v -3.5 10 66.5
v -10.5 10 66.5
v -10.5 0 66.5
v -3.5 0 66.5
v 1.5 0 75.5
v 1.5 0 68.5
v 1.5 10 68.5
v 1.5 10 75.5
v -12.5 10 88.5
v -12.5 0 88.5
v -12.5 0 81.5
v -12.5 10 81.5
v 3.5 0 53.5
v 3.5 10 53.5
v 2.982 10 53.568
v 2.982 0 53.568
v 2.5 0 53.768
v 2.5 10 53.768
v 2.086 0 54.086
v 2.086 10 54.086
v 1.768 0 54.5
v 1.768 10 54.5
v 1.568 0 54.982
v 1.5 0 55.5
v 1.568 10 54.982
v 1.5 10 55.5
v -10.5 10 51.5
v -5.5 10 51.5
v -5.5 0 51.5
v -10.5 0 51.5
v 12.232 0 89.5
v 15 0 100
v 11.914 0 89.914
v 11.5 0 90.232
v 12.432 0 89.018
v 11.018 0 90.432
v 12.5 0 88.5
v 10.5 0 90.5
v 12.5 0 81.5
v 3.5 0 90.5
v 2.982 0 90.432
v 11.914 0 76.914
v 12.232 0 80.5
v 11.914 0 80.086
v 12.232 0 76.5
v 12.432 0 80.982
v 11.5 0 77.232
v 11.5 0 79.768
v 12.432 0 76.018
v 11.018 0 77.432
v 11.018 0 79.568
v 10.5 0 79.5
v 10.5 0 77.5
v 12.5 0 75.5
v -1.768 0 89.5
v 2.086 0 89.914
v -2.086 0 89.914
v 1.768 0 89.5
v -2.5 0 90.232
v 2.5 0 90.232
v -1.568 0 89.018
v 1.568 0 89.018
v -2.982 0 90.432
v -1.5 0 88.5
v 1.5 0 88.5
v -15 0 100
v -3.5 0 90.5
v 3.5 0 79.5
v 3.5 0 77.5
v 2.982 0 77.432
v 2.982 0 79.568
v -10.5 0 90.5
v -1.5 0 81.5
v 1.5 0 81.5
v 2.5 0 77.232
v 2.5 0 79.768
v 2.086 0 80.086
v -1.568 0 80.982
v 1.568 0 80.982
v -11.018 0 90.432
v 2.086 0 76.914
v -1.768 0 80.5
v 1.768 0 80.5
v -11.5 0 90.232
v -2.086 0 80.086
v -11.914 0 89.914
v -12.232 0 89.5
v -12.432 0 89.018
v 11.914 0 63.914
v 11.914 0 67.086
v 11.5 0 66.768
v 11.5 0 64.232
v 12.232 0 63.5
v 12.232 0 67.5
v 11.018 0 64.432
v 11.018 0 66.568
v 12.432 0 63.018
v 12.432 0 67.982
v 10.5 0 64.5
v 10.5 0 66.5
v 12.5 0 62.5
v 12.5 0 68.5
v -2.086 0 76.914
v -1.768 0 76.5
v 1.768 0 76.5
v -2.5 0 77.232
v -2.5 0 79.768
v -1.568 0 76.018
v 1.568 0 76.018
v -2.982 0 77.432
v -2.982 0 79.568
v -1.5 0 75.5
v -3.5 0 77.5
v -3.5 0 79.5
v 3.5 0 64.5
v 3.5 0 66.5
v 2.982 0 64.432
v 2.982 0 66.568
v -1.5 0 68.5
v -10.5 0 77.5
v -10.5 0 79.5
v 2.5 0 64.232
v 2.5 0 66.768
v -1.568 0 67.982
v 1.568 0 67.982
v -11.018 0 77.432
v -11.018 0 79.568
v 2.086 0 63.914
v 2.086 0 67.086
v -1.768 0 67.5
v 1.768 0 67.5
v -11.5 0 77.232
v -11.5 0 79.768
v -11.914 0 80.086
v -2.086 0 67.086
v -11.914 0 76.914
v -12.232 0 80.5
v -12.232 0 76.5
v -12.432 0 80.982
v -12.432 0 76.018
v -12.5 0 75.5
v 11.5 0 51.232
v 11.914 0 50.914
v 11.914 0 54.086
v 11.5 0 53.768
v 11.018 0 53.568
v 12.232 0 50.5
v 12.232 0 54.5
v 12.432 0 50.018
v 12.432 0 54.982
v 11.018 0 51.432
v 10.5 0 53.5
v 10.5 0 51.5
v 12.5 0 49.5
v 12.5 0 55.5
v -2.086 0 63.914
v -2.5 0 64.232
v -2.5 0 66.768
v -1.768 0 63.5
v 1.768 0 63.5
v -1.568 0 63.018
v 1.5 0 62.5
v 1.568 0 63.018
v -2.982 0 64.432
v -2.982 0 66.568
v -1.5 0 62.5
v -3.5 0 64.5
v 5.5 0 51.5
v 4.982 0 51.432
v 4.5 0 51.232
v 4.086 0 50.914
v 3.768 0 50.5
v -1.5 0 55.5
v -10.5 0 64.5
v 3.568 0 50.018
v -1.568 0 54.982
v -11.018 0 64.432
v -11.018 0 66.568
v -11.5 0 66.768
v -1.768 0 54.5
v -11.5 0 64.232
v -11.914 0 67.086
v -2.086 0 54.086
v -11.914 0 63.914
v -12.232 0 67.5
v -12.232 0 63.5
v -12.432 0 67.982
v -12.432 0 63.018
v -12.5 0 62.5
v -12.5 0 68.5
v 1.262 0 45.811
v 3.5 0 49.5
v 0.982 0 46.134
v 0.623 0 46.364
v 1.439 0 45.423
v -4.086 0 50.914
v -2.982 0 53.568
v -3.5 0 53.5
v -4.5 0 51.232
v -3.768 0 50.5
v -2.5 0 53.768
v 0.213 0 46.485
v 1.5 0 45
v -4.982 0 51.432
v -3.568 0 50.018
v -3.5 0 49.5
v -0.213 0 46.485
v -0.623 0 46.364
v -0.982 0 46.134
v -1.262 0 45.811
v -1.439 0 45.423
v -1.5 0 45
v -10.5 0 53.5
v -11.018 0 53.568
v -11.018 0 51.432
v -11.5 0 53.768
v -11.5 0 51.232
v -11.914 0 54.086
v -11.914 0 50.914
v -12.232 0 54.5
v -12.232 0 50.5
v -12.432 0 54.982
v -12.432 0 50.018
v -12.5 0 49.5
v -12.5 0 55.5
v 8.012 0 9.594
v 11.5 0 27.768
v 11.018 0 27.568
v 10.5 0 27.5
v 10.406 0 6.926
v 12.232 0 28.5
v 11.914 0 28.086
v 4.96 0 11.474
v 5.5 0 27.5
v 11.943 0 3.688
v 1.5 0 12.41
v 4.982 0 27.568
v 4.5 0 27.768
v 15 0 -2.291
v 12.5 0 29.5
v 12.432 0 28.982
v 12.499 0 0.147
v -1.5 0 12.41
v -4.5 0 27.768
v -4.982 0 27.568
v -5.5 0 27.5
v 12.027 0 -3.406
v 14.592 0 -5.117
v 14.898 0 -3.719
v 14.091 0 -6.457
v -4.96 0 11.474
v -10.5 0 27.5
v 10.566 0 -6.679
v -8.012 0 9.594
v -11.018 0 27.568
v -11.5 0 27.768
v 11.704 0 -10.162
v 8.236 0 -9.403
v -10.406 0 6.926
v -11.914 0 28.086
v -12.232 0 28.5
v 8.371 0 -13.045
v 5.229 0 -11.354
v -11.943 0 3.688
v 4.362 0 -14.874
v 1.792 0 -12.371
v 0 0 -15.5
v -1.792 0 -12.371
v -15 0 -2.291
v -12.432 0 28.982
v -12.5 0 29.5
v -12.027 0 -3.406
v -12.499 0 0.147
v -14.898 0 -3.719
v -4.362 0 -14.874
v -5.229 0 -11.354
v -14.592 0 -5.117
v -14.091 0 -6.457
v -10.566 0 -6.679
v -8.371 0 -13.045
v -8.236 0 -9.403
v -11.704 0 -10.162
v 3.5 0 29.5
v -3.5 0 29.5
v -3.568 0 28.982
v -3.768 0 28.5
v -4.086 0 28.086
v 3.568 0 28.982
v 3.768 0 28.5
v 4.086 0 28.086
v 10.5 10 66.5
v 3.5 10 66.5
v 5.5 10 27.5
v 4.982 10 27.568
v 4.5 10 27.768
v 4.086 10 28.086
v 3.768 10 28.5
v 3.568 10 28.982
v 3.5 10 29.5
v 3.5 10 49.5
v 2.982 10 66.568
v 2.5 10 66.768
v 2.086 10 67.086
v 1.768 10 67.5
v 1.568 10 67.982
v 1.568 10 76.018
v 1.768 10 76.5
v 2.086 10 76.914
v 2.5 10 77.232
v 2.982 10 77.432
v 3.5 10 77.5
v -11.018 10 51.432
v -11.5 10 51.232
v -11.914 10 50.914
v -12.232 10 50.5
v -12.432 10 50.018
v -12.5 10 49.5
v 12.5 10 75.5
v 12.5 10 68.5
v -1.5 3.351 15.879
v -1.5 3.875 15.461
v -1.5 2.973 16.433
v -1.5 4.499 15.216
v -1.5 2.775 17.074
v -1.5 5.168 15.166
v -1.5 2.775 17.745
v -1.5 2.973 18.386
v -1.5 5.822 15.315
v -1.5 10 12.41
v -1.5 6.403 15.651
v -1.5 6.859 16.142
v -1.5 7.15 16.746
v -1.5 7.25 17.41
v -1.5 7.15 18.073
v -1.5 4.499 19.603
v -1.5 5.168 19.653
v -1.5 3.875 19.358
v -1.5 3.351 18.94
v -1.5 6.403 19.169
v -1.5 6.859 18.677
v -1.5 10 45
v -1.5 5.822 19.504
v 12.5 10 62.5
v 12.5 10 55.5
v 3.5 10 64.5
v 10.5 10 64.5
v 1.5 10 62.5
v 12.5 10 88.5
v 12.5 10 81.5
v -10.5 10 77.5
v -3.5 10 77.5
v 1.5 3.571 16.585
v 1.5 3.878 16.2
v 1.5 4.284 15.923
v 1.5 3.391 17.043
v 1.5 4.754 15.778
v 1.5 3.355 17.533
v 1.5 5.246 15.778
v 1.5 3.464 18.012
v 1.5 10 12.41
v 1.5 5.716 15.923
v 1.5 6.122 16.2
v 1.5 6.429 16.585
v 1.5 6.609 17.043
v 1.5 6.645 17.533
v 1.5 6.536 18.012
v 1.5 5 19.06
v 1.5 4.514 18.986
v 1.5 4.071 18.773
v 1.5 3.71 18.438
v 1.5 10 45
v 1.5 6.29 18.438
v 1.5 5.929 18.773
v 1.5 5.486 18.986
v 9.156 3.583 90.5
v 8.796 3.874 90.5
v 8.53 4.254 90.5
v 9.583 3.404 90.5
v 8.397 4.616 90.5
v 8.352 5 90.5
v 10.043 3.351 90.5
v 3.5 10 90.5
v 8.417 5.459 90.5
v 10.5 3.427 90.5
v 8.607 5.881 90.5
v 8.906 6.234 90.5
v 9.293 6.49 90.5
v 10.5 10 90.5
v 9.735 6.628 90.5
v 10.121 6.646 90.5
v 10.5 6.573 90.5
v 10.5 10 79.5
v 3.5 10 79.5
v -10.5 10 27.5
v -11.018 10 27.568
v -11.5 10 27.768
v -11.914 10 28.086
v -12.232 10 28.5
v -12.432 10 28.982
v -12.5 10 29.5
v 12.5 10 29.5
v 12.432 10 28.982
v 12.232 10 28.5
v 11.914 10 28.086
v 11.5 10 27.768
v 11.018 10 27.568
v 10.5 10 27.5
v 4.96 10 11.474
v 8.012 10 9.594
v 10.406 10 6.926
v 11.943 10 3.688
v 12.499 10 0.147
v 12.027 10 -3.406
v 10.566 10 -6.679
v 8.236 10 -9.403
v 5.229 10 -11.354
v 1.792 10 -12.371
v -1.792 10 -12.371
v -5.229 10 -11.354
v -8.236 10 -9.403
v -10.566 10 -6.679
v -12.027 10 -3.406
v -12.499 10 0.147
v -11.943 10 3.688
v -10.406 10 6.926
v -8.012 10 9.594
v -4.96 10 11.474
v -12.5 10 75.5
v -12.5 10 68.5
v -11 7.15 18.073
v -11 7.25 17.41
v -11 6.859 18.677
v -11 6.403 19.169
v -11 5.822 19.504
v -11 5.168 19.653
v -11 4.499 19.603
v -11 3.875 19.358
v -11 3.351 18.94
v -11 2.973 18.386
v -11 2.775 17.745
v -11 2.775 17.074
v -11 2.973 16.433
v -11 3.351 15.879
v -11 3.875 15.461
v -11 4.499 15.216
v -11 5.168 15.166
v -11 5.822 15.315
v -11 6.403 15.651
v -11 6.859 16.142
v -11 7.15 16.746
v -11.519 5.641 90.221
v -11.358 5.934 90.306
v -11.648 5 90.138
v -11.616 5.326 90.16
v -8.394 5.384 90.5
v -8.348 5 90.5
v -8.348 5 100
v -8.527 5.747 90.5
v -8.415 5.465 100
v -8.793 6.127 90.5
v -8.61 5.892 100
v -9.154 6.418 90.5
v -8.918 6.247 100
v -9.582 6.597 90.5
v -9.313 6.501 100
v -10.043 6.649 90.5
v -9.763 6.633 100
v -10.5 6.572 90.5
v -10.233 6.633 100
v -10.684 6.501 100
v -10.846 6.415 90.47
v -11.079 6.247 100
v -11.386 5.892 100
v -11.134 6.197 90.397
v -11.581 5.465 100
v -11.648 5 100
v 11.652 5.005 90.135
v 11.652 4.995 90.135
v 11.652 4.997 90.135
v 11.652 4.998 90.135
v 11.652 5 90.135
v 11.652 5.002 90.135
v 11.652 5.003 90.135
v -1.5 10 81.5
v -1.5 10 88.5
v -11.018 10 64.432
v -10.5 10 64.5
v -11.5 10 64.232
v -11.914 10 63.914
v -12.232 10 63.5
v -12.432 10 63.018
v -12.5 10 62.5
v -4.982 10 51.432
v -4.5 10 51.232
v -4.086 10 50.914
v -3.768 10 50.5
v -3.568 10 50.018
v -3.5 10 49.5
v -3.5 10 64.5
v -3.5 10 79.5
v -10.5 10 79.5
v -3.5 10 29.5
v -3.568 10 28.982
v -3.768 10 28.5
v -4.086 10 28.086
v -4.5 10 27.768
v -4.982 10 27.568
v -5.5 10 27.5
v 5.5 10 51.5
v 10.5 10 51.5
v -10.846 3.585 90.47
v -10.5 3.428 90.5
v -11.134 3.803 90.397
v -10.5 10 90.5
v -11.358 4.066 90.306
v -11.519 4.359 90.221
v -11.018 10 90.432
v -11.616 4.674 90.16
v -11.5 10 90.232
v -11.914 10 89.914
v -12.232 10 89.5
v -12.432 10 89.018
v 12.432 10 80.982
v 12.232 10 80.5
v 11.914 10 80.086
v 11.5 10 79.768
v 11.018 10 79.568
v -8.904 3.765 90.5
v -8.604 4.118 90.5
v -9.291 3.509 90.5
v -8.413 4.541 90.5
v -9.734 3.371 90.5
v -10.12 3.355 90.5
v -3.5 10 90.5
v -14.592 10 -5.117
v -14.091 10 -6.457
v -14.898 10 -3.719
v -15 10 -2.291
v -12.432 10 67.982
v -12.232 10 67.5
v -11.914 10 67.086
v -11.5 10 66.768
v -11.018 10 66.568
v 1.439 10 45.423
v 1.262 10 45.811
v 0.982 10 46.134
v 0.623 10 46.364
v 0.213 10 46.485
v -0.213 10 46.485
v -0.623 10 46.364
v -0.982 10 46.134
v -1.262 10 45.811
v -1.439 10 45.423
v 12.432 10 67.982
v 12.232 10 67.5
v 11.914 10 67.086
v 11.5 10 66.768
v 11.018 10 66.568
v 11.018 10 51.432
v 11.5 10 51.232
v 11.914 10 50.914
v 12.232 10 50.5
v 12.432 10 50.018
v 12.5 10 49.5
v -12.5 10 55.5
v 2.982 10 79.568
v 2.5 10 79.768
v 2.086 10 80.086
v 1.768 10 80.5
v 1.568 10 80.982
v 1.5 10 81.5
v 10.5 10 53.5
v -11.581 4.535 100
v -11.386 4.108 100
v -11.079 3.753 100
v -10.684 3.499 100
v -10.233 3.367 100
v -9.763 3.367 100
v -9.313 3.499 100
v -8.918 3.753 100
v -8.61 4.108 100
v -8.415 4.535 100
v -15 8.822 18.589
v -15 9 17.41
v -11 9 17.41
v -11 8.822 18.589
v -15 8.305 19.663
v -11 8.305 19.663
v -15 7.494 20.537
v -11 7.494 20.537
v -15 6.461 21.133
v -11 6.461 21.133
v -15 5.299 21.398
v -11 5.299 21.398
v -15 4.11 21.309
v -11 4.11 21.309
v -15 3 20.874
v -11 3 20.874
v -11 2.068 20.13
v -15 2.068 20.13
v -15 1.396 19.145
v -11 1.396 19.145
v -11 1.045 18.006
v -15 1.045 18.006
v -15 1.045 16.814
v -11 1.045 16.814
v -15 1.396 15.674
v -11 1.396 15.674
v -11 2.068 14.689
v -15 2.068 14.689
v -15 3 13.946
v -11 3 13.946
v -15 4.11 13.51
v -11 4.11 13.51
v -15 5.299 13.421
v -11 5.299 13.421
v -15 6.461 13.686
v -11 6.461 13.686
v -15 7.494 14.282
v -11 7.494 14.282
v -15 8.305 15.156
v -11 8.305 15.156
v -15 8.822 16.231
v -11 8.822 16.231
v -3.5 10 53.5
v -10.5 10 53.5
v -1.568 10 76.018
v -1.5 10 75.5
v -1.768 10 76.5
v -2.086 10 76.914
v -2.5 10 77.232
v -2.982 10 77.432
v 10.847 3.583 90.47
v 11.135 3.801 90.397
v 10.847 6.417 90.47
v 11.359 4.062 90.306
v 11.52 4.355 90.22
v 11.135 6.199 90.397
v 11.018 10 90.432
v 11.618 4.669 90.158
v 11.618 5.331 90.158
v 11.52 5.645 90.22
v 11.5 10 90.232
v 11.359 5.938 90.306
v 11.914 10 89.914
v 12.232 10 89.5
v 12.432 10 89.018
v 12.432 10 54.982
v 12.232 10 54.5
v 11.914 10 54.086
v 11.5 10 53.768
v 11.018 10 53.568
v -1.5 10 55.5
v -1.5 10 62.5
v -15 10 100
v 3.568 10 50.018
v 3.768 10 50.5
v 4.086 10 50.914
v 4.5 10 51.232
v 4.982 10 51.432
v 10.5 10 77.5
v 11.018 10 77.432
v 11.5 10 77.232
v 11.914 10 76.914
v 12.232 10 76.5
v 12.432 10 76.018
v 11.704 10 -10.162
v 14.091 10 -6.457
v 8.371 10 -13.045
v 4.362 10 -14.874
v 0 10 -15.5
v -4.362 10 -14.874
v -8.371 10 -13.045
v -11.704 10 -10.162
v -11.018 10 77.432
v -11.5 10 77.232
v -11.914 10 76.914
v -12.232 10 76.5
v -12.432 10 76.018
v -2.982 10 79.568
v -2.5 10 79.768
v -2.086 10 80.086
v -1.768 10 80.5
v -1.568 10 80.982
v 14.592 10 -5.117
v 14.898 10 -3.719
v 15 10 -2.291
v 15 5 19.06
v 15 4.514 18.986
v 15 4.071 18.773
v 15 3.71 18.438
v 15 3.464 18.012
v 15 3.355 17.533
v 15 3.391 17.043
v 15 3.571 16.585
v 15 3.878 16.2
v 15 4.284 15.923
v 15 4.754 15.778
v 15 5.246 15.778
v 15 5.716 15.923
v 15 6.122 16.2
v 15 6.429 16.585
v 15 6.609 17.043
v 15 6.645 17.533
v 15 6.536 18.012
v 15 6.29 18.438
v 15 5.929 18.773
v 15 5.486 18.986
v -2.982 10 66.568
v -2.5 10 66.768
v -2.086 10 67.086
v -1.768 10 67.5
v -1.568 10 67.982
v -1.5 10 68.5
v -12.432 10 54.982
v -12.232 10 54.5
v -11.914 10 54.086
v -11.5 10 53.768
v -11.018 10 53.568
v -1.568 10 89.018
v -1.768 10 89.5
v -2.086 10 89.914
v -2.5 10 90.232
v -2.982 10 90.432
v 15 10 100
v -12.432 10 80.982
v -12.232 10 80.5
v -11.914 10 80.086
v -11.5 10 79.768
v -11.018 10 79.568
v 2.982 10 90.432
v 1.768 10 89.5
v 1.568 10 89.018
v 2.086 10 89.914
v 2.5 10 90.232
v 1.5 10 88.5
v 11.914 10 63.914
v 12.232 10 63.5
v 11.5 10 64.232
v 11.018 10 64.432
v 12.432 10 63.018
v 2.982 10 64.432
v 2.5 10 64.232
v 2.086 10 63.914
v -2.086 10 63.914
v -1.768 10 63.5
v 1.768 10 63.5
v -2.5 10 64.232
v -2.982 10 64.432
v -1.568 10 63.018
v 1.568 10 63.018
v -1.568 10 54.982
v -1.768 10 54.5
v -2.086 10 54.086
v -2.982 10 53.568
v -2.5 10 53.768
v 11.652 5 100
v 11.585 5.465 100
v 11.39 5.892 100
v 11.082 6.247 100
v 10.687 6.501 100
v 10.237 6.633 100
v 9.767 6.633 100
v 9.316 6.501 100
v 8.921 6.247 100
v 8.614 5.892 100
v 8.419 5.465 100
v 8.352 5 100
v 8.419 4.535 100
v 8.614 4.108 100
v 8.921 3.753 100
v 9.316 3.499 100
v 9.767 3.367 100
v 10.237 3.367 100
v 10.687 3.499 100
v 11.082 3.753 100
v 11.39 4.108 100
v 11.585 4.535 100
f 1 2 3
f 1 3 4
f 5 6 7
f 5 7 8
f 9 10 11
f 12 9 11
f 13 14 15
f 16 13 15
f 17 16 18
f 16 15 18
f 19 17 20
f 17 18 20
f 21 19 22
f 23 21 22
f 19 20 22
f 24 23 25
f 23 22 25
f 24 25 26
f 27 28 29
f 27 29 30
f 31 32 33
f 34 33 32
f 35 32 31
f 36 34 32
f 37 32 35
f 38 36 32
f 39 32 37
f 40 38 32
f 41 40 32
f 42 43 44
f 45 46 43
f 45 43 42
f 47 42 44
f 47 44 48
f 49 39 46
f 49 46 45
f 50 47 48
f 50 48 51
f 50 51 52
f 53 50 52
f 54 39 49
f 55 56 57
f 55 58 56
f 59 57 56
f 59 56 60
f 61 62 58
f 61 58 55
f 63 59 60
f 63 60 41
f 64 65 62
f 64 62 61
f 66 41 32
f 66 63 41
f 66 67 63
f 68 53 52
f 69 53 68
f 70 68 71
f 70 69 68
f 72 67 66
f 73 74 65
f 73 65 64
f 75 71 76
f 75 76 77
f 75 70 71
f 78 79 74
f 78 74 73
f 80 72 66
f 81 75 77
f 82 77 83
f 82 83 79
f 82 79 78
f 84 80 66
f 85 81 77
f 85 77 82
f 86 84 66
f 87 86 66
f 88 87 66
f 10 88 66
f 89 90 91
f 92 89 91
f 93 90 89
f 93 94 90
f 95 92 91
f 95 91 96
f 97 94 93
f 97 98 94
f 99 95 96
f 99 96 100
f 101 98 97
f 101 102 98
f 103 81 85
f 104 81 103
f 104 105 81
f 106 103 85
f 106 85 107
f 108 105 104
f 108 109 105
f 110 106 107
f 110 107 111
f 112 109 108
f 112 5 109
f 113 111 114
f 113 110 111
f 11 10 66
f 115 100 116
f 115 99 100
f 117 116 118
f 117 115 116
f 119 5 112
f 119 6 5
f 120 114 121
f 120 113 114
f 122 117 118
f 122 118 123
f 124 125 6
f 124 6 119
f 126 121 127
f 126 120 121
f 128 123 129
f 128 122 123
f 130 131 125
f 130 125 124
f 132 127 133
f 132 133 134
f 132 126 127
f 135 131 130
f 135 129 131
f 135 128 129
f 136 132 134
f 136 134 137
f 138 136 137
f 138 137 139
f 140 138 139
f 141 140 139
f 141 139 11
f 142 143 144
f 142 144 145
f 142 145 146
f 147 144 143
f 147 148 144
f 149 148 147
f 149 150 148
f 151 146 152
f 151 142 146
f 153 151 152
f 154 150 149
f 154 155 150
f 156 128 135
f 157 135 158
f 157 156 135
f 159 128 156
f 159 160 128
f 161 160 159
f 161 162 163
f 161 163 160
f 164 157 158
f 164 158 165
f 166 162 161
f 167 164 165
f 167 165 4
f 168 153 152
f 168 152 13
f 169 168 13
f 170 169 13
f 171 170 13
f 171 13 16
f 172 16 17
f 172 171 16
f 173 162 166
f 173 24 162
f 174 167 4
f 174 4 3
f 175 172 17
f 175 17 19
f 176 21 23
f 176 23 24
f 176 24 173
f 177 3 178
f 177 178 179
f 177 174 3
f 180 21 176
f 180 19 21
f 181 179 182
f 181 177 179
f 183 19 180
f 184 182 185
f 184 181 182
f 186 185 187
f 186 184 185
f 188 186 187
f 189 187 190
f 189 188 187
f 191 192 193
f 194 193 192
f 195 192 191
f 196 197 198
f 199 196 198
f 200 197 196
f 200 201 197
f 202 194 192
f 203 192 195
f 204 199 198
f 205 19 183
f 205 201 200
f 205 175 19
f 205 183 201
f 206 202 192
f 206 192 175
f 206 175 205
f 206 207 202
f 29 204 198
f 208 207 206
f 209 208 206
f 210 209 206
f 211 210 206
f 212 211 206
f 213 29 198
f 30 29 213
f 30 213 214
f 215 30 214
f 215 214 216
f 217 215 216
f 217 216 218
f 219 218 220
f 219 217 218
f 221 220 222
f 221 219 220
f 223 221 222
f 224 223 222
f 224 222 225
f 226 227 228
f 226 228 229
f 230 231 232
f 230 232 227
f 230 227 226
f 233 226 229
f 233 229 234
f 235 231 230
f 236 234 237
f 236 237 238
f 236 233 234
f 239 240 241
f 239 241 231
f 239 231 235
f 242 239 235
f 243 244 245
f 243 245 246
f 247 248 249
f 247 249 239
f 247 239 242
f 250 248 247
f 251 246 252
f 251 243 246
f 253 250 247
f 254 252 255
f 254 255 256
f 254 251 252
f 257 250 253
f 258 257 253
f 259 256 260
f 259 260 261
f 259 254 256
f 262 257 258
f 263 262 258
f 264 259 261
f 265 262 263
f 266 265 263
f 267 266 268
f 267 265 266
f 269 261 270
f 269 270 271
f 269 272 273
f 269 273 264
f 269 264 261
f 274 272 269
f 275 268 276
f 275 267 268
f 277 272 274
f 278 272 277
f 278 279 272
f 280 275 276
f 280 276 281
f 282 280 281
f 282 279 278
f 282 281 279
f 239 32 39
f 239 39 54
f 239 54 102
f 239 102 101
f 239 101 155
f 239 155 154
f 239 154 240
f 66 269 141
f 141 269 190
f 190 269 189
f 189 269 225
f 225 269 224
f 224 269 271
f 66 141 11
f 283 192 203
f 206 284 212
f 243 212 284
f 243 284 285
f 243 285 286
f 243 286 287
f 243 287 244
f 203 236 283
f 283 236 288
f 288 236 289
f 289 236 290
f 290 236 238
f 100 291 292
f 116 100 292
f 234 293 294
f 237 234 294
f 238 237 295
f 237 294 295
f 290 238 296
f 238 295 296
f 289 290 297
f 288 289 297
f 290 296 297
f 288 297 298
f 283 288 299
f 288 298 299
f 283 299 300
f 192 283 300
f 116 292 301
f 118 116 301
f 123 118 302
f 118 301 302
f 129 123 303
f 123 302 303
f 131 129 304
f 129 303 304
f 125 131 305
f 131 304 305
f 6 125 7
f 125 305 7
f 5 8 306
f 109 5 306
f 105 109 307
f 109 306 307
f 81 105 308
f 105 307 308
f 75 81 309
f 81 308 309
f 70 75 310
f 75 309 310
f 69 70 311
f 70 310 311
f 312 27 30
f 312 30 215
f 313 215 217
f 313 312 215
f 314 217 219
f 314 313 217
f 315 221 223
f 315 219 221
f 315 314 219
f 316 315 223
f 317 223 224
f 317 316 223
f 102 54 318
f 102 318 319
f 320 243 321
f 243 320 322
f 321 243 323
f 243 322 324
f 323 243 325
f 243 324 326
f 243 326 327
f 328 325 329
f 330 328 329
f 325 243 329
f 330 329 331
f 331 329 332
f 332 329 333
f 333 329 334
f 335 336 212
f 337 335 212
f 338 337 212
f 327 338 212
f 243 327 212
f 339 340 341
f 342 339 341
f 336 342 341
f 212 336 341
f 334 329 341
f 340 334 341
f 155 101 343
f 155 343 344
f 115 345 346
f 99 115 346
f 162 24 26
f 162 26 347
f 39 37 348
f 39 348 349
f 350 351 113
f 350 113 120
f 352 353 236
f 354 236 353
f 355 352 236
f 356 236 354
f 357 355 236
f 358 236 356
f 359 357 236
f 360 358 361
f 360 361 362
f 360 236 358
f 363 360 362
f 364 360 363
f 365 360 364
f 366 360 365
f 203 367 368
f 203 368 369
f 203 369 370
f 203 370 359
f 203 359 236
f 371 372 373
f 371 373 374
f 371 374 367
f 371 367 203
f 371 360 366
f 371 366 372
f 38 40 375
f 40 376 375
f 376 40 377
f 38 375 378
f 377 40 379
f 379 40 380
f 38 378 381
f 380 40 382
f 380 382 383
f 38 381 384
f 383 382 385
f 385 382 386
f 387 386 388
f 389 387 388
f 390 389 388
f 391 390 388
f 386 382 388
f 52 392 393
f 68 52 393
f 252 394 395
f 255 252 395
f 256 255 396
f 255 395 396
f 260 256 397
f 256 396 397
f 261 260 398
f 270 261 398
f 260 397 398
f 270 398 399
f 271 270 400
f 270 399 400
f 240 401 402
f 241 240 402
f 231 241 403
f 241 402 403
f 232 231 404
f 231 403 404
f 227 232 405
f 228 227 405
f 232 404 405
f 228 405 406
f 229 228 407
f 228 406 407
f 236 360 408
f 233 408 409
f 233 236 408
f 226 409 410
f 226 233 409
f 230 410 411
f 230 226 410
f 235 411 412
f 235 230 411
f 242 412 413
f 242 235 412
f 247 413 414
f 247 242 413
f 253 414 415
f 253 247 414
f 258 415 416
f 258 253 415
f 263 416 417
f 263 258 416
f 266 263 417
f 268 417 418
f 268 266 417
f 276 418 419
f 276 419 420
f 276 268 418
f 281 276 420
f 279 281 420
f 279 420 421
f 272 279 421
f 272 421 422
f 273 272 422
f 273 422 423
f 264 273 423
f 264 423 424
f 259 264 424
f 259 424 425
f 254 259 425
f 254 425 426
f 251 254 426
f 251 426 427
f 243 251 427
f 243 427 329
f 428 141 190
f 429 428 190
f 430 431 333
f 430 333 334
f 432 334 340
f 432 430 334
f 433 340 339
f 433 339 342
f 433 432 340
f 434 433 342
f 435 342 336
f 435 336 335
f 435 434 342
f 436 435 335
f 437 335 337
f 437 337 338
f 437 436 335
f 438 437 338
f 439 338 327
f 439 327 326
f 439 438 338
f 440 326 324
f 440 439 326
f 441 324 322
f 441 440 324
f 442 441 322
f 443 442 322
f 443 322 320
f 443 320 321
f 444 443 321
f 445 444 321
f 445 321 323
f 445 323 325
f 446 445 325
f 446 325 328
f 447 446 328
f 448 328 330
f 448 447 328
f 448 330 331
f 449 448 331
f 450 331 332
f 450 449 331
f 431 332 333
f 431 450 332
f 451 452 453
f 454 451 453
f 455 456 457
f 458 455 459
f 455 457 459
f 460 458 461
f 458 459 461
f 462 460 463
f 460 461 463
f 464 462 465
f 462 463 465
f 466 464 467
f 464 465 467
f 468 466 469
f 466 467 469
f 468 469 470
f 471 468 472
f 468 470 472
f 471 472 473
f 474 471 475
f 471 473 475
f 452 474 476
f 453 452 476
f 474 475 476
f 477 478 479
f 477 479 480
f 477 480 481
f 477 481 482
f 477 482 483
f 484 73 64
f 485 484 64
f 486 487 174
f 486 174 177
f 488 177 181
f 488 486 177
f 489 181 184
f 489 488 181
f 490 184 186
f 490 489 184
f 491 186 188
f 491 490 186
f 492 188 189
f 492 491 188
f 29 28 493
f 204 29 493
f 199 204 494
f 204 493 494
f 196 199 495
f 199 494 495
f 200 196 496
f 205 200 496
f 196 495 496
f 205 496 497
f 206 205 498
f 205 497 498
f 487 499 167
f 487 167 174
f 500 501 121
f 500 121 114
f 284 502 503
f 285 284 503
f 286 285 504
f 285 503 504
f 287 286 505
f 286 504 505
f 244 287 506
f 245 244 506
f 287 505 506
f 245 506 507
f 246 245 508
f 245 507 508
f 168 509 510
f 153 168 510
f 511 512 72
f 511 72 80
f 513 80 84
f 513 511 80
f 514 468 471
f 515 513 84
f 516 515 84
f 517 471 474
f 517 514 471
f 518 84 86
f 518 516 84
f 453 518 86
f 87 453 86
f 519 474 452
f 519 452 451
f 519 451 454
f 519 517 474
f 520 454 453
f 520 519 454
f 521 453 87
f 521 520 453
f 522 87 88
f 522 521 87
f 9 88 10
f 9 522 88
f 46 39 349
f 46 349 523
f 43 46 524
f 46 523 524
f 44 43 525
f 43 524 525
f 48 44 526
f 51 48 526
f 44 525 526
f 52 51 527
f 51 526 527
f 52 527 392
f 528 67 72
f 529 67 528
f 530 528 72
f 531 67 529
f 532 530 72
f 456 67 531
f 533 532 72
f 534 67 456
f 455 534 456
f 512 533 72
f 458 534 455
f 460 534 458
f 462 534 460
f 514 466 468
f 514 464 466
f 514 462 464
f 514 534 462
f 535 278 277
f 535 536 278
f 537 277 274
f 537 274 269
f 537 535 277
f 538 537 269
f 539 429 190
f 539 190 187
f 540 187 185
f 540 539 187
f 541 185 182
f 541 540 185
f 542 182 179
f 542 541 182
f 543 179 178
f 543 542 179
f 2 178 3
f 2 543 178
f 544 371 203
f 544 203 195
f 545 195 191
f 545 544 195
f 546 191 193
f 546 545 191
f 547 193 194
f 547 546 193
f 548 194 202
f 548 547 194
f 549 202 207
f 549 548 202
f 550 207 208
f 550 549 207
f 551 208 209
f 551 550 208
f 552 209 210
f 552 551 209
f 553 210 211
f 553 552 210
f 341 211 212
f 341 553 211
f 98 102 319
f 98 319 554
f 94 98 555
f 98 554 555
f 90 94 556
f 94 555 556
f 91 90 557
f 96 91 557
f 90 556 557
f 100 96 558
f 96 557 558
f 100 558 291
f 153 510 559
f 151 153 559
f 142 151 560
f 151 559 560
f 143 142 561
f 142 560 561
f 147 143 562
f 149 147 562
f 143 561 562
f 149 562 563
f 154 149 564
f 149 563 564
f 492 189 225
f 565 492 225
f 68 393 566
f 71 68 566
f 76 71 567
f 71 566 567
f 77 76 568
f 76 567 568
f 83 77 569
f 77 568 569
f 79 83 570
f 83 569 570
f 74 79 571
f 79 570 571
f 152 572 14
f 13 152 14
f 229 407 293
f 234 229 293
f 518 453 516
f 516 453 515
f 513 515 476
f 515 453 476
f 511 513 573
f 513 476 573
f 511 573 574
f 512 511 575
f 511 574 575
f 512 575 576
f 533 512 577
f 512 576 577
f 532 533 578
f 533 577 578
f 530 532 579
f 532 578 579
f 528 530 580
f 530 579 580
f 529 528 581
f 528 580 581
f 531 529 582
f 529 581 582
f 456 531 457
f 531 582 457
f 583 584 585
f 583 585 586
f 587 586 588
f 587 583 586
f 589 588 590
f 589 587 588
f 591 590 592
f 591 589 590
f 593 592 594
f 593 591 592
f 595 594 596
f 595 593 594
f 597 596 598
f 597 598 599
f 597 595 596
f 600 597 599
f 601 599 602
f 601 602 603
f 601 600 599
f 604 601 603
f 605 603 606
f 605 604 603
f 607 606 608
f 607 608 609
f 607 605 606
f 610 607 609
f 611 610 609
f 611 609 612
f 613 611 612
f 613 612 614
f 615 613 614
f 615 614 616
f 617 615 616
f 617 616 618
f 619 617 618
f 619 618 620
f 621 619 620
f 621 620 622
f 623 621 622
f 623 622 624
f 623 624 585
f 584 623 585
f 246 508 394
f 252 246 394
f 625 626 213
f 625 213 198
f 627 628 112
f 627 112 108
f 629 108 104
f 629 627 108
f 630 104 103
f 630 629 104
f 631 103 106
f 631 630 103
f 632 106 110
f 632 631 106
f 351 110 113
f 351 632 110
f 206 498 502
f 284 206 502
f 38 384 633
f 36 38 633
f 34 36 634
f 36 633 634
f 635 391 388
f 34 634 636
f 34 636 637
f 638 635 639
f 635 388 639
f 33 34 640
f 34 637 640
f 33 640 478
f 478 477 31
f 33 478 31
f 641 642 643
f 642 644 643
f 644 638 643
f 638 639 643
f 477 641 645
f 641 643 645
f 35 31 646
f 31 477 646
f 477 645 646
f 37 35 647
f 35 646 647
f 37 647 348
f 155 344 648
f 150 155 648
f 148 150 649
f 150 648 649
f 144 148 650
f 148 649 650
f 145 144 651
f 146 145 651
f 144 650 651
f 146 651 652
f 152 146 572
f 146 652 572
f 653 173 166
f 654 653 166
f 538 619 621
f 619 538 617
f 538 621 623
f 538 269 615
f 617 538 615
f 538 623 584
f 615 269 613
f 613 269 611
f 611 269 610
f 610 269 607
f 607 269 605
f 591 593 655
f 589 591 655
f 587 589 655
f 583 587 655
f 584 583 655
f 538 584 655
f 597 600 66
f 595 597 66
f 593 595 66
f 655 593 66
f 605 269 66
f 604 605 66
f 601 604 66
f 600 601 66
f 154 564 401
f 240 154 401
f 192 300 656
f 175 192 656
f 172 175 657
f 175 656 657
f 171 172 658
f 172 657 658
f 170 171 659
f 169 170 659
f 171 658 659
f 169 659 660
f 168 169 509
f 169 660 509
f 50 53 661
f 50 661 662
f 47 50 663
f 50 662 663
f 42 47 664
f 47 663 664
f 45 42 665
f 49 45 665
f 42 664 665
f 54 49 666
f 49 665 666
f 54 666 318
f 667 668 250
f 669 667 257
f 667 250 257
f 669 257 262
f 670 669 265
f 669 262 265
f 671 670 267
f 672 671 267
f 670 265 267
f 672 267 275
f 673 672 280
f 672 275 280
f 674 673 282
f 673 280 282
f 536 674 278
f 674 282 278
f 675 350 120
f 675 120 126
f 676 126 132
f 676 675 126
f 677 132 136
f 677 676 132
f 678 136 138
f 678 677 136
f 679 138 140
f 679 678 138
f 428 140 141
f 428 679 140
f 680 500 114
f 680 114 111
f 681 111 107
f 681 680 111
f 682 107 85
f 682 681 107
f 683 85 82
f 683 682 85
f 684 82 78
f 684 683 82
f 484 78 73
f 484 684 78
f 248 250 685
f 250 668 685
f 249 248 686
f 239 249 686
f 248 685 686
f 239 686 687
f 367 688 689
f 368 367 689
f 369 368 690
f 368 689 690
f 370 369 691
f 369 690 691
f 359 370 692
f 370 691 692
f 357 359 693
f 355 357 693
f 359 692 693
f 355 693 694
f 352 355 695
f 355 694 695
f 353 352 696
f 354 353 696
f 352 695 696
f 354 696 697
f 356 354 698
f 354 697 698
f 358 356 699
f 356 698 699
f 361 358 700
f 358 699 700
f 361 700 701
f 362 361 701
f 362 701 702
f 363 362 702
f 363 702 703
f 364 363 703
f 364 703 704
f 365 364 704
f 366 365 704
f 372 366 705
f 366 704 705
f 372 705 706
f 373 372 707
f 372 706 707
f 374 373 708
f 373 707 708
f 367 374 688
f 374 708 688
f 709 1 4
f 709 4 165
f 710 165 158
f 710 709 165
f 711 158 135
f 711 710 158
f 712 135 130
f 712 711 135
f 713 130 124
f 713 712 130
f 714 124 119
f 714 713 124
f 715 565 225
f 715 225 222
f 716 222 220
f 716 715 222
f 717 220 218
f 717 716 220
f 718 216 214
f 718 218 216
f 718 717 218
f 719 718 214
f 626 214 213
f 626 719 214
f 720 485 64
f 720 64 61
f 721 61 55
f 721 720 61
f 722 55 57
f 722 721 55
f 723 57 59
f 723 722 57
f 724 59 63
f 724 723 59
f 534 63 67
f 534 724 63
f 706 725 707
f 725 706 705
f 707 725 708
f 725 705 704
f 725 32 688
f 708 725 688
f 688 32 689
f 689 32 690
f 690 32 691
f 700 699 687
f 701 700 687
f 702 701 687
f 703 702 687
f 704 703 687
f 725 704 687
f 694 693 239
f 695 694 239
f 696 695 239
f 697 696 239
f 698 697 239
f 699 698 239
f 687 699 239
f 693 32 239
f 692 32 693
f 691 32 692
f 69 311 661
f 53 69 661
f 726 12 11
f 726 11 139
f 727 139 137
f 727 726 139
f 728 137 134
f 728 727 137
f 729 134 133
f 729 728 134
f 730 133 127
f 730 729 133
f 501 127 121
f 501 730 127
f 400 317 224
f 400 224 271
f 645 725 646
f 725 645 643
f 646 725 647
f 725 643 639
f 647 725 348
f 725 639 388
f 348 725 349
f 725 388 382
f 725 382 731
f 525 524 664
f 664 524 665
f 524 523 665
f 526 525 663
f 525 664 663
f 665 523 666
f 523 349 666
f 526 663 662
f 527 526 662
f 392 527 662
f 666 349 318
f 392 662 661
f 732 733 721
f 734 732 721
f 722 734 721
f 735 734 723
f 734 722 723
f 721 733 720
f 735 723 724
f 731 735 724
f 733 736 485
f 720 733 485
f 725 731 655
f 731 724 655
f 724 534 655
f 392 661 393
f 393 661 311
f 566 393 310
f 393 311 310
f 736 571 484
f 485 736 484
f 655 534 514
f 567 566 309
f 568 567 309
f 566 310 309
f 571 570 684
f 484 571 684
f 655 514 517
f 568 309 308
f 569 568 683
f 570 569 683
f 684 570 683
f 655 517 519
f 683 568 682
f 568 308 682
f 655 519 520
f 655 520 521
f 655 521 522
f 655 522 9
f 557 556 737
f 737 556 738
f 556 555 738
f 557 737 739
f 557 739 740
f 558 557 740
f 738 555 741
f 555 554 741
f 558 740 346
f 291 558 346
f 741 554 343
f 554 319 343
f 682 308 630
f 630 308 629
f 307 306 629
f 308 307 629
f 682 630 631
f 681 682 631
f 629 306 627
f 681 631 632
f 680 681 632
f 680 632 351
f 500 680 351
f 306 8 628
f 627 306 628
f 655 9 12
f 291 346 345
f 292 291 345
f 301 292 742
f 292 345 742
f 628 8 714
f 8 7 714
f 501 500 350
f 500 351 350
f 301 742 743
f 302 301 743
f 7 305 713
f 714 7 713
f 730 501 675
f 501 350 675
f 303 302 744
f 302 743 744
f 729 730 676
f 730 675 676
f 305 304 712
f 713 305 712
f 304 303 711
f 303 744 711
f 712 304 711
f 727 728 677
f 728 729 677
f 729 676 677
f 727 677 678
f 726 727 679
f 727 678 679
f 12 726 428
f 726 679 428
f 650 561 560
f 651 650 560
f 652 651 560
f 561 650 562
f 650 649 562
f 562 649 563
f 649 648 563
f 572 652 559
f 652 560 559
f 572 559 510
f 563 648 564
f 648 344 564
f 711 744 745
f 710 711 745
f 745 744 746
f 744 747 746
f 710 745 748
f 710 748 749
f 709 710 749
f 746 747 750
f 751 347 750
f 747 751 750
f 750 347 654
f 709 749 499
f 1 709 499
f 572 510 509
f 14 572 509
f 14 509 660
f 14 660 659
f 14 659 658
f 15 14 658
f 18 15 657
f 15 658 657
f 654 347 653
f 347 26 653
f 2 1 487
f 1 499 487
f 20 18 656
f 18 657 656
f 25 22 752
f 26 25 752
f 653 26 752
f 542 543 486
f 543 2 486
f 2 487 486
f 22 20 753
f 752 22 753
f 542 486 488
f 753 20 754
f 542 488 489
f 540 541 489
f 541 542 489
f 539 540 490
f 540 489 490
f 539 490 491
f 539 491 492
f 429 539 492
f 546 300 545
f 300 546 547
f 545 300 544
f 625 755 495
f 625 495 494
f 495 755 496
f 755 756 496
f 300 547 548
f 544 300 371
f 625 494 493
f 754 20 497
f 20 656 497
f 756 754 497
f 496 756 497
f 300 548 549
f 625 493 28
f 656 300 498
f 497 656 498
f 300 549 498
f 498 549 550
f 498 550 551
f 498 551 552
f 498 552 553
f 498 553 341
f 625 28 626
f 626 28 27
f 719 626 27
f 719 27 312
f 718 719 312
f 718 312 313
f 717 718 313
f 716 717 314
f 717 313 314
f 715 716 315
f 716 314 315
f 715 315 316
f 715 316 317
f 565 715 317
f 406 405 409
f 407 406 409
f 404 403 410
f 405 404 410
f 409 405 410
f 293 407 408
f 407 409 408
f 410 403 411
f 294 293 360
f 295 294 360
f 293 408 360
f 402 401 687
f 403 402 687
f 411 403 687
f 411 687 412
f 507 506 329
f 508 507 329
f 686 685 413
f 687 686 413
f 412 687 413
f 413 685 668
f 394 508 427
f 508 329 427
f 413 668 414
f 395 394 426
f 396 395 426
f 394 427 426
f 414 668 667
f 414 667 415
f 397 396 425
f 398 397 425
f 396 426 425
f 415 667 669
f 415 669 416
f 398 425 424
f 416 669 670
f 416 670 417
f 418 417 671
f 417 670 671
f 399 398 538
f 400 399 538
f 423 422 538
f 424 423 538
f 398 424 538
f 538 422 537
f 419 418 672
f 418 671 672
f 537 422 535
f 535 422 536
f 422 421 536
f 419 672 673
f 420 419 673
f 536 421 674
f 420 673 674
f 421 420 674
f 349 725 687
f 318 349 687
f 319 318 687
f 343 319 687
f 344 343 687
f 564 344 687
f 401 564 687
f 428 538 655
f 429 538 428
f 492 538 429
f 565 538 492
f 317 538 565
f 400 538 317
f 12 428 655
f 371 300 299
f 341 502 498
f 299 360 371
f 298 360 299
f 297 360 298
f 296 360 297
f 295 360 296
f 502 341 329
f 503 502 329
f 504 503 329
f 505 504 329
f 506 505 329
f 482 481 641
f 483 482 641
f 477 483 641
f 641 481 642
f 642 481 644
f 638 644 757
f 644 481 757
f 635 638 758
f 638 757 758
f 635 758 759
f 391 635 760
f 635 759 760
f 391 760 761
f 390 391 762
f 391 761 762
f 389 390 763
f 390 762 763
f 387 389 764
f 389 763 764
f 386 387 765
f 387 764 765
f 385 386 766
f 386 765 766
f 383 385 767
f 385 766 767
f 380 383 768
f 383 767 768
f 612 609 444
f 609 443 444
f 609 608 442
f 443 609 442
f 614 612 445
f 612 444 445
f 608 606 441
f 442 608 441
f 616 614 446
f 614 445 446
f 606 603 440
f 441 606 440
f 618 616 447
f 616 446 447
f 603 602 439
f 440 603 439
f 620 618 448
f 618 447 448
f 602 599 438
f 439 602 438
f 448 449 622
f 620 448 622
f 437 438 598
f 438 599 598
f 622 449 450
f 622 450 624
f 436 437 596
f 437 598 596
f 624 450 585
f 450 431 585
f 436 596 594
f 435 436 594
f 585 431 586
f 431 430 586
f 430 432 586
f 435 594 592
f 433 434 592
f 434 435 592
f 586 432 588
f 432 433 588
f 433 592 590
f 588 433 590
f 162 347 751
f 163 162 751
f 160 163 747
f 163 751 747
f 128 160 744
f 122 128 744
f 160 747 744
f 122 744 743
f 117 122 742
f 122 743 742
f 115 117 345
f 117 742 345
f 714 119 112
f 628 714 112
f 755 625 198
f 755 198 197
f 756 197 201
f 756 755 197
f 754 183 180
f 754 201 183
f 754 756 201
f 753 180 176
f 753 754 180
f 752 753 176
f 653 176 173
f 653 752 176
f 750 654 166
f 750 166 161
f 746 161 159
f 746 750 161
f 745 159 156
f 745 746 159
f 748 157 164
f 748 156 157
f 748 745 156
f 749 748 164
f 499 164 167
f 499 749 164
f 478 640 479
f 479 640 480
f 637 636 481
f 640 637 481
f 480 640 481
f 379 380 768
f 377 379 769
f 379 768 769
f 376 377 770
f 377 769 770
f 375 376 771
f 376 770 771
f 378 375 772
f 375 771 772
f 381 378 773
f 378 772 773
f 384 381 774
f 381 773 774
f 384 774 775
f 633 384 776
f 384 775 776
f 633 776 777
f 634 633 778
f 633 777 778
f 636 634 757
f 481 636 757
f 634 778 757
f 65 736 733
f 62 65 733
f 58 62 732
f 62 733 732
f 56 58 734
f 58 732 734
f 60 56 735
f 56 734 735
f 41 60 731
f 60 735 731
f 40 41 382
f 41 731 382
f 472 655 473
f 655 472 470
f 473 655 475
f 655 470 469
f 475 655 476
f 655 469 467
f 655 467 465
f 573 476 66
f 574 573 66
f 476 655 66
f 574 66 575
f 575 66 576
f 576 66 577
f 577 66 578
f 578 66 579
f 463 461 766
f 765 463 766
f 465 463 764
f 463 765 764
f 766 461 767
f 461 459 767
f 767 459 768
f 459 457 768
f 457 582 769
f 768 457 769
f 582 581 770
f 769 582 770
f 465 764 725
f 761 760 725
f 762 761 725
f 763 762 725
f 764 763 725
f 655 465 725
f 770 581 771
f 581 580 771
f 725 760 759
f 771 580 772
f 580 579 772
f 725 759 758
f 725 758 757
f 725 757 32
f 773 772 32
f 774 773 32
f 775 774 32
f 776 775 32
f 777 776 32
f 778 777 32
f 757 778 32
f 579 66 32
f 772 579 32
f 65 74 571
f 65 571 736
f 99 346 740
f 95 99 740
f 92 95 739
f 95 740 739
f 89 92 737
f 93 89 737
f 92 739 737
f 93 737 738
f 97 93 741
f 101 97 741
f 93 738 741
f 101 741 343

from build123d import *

# Parameters (mm, degrees)
SKETCH_1_R                  = 12.5
EXTRUDE_1_DEPTH             = 10
CUT_EXTRUDE_5_DEPTH         = 102.687019821
SKETCH_8_W                  = 1.65
SKETCH_8_H                  = 14
HOLE_START                  = -16
HOLE_WIZARD_M41_OUTLINE_R   = 4
HOLE_WIZARD_M41_DEPTH       = 5
HOLE_START_2                = -11
HOLE_WIZARD_M41_2_OUTLINE_R = 2.25
HOLE_WIZARD_M41_2_DEPTH     = 9.5
CUT_EXTRUDE_START           = -10
CUT_EXTRUDE_6_DEPTH         = 10
FILLET_1_R                  = 10
CUT_EXTRUDE_7_DEPTH         = 102.612007273
EXTRUDE_2_DEPTH             = 10
CUT_EXTRUDE_8_DEPTH         = 102.612007273


with BuildPart() as part:
    # Эскиз1 → Бобышка-Вытянуть1 (new body)
    with BuildSketch(Plane(origin=(0, 0, 0), x_dir=(1, 0, 0), z_dir=(0, 1, 0))):
        with BuildLine():
            Line((-15.5, 0), (-15.5, -100))
            Line((-15.5, -100), (15.5, -100))
            Line((15.5, -100), (15.5, 0))
            ThreePointArc((15.5, 0), (0, 15.5), (-15.5, 0))
        make_face()
        with Locations(Location((0, 0, 0), (0, 0, 270))):
            Circle(SKETCH_1_R, mode=Mode.SUBTRACT)
    extrude(amount=EXTRUDE_1_DEPTH)

    # Эскиз6 → Вырез-Вытянуть5 (cut, through all)
    with BuildSketch(Plane(origin=(0, 10, 0), x_dir=(1, 0, 0), z_dir=(0, 1, 0))):
        with BuildLine():
            Line((-1.5, -12.409673646), (-1.5, -26))
            ThreePointArc((-1.5, -26), (0, -27.5), (1.5, -26))
            Line((1.5, -26), (1.5, -12.409673646))
            ThreePointArc((1.5, -12.409673646), (0, -12.5), (-1.5, -12.409673646))
        make_face()
        with BuildLine():
            Line((-1.5, -42.5), (-1.5, -49.5))
            ThreePointArc((-1.5, -49.5), (-2.085786438, -50.914213562), (-3.5, -51.5))
            Line((-3.5, -51.5), (-10.5, -51.5))
            ThreePointArc((-10.5, -51.5), (-11.914213562, -50.914213562), (-12.5, -49.5))
            Line((-12.5, -49.5), (-12.5, -42.5))
            ThreePointArc((-12.5, -42.5), (-11.914213562, -41.085786438), (-10.5, -40.5))
            Line((-10.5, -40.5), (-3.5, -40.5))
            ThreePointArc((-3.5, -40.5), (-2.085786438, -41.085786438), (-1.5, -42.5))
        make_face()
        with BuildLine():
            Line((-1.5, -55.5), (-1.5, -62.5))
            ThreePointArc((-1.5, -62.5), (-2.085786438, -63.914213562), (-3.5, -64.5))
            Line((-3.5, -64.5), (-10.5, -64.5))
            ThreePointArc((-10.5, -64.5), (-11.914213562, -63.914213562), (-12.5, -62.5))
            Line((-12.5, -62.5), (-12.5, -55.5))
            ThreePointArc((-12.5, -55.5), (-11.914213562, -54.085786438), (-10.5, -53.5))
            Line((-10.5, -53.5), (-3.5, -53.5))
            ThreePointArc((-3.5, -53.5), (-2.085786438, -54.085786438), (-1.5, -55.5))
        make_face()
        with BuildLine():
            Line((-1.5, -68.5), (-1.5, -75.5))
            ThreePointArc((-1.5, -75.5), (-2.085786438, -76.914213562), (-3.5, -77.5))
            Line((-3.5, -77.5), (-10.5, -77.5))
            ThreePointArc((-10.5, -77.5), (-11.914213562, -76.914213562), (-12.5, -75.5))
            Line((-12.5, -75.5), (-12.5, -68.5))
            ThreePointArc((-12.5, -68.5), (-11.914213562, -67.085786438), (-10.5, -66.5))
            Line((-10.5, -66.5), (-3.5, -66.5))
            ThreePointArc((-3.5, -66.5), (-2.085786438, -67.085786438), (-1.5, -68.5))
        make_face()
        with BuildLine():
            Line((-1.5, -81.5), (-1.5, -88.5))
            ThreePointArc((-1.5, -88.5), (-2.085786438, -89.914213562), (-3.5, -90.5))
            Line((-3.5, -90.5), (-10.5, -90.5))
            ThreePointArc((-10.5, -90.5), (-11.914213562, -89.914213562), (-12.5, -88.5))
            Line((-12.5, -88.5), (-12.5, -81.5))
            ThreePointArc((-12.5, -81.5), (-11.914213562, -80.085786438), (-10.5, -79.5))
            Line((-10.5, -79.5), (-3.5, -79.5))
            ThreePointArc((-3.5, -79.5), (-2.085786438, -80.085786438), (-1.5, -81.5))
        make_face()
        with BuildLine():
            Line((1.5, -29.5), (1.5, -36.5))
            ThreePointArc((1.5, -36.5), (2.085786438, -37.914213562), (3.5, -38.5))
            Line((3.5, -38.5), (10.5, -38.5))
            ThreePointArc((10.5, -38.5), (11.914213562, -37.914213562), (12.5, -36.5))
            Line((12.5, -36.5), (12.5, -29.5))
            ThreePointArc((12.5, -29.5), (11.914213562, -28.085786438), (10.5, -27.5))
            Line((10.5, -27.5), (3.5, -27.5))
            ThreePointArc((3.5, -27.5), (2.085786438, -28.085786438), (1.5, -29.5))
        make_face()
        with BuildLine():
            Line((-12.5, -29.5), (-12.5, -36.5))
            ThreePointArc((-12.5, -36.5), (-11.914213562, -37.914213562), (-10.5, -38.5))
            Line((-10.5, -38.5), (-3.5, -38.5))
            ThreePointArc((-3.5, -38.5), (-2.085786438, -37.914213562), (-1.5, -36.5))
            Line((-1.5, -36.5), (-1.5, -29.5))
            ThreePointArc((-1.5, -29.5), (-2.085786438, -28.085786438), (-3.5, -27.5))
            Line((-3.5, -27.5), (-10.5, -27.5))
            ThreePointArc((-10.5, -27.5), (-11.914213562, -28.085786438), (-12.5, -29.5))
        make_face()
        with BuildLine():
            Line((10.5, -79.5), (3.5, -79.5))
            ThreePointArc((3.5, -79.5), (2.085786438, -80.085786438), (1.5, -81.5))
            Line((1.5, -81.5), (1.5, -88.5))
            ThreePointArc((1.5, -88.5), (2.085786438, -89.914213562), (3.5, -90.5))
            Line((3.5, -90.5), (10.5, -90.5))
            ThreePointArc((10.5, -90.5), (11.914213562, -89.914213562), (12.5, -88.5))
            Line((12.5, -88.5), (12.5, -81.5))
            ThreePointArc((12.5, -81.5), (11.914213562, -80.085786438), (10.5, -79.5))
        make_face()
        with BuildLine():
            Line((10.5, -66.5), (3.5, -66.5))
            ThreePointArc((3.5, -66.5), (2.085786438, -67.085786438), (1.5, -68.5))
            Line((1.5, -68.5), (1.5, -75.5))
            ThreePointArc((1.5, -75.5), (2.085786438, -76.914213562), (3.5, -77.5))
            Line((3.5, -77.5), (10.5, -77.5))
            ThreePointArc((10.5, -77.5), (11.914213562, -76.914213562), (12.5, -75.5))
            Line((12.5, -75.5), (12.5, -68.5))
            ThreePointArc((12.5, -68.5), (11.914213562, -67.085786438), (10.5, -66.5))
        make_face()
        with BuildLine():
            Line((10.5, -53.5), (3.5, -53.5))
            ThreePointArc((3.5, -53.5), (2.085786438, -54.085786438), (1.5, -55.5))
            Line((1.5, -55.5), (1.5, -62.5))
            ThreePointArc((1.5, -62.5), (2.085786438, -63.914213562), (3.5, -64.5))
            Line((3.5, -64.5), (10.5, -64.5))
            ThreePointArc((10.5, -64.5), (11.914213562, -63.914213562), (12.5, -62.5))
            Line((12.5, -62.5), (12.5, -55.5))
            ThreePointArc((12.5, -55.5), (11.914213562, -54.085786438), (10.5, -53.5))
        make_face()
        with BuildLine():
            Line((10.5, -40.5), (3.5, -40.5))
            ThreePointArc((3.5, -40.5), (2.085786438, -41.085786438), (1.5, -42.5))
            Line((1.5, -42.5), (1.5, -49.5))
            ThreePointArc((1.5, -49.5), (2.085786438, -50.914213562), (3.5, -51.5))
            Line((3.5, -51.5), (10.5, -51.5))
            ThreePointArc((10.5, -51.5), (11.914213562, -50.914213562), (12.5, -49.5))
            Line((12.5, -49.5), (12.5, -42.5))
            ThreePointArc((12.5, -42.5), (11.914213562, -41.085786438), (10.5, -40.5))
        make_face()
    extrude(amount=-CUT_EXTRUDE_5_DEPTH, mode=Mode.SUBTRACT)

    # Эскиз8 → Отверстие обработанное метчиком M4x0.71 (revolve, cut)
    with BuildSketch(Plane(origin=(1.5, 5, 17.409673646), x_dir=(0, 0, 1), z_dir=(0, 1, 0))):
        with Locations((0.825, 7)):
            Rectangle(SKETCH_8_W, SKETCH_8_H)
    revolve(axis=Axis((-4.85, 5, 17.409673646), (1, 0, 0)), mode=Mode.SUBTRACT)

    # Цековка для винта с внутренним шестигранником M41: read off the stored shape, not the designer's step
    # Цековка для винта с внутренним шестигранником M41 outline → Цековка для винта с внутренним шестигранником M41 (cut)
    with BuildSketch(Plane.YZ.offset(HOLE_START)):
        with Locations((5, 17.409673646)):
            Circle(HOLE_WIZARD_M41_OUTLINE_R)
    extrude(amount=HOLE_WIZARD_M41_DEPTH, mode=Mode.SUBTRACT)

    # Hole Wizard M41 2 outline → Hole Wizard M41 2 (cut)
    with BuildSketch(Plane.YZ.offset(HOLE_START_2)):
        with Locations((5, 17.409673646)):
            Circle(HOLE_WIZARD_M41_2_OUTLINE_R)
    extrude(amount=HOLE_WIZARD_M41_2_DEPTH, mode=Mode.SUBTRACT)

    # Эскиз12 → Вырез-Вытянуть6 (cut)
    with BuildSketch(Plane(origin=(0, 10, 0), x_dir=(1, 0, 0), z_dir=(0, 1, 0)).offset(CUT_EXTRUDE_START)):
        with BuildLine():
            Line((-15, 3.905124838), (-15, -100))
            Line((-15, -100), (-15.5, -100))
            Line((-15.5, -100), (-15.5, 0))
            ThreePointArc((-15.5, 0), (-15.374491862, 1.968501969), (-15, 3.905124838))
        make_face()
        with BuildLine():
            Line((15, -100), (15, 3.905124838))
            ThreePointArc((15, 3.905124838), (15.374491862, 1.968501969), (15.5, 0))
            Line((15.5, 0), (15.5, -100))
            Line((15.5, -100), (15, -100))
        make_face()
    extrude(amount=CUT_EXTRUDE_6_DEPTH, mode=Mode.SUBTRACT)

    # Скругление1
    fillet_1_edges = [part.edges().sort_by_distance(p)[0] for p in [
        (15, 5, -3.905124838),
        (-15, 5, -3.905124838),
    ]]
    fillet(fillet_1_edges, radius=FILLET_1_R)

    # Отверстие обработанное метчиком M4x0.72: read off the stored shape, not the designer's step
    # Отверстие обработанное метчиком M4x0.72: loft between two sections, ruled curve by curve
    m4x0_72_from = [
        Edge.make_three_point_arc((11.651711547, 5, 90.135107967), (10.001711547, 6.65, 90.135107967), (8.351711547, 5, 90.135107967)),
        Edge.make_three_point_arc((8.351711547, 5, 90.135107967), (10.001711547, 3.35, 90.135107967), (11.651711547, 5, 90.135107967)),
    ]
    m4x0_72_to = [
        Edge.make_three_point_arc((11.651711547, 5, 100), (10.001711547, 6.65, 100), (8.351711547, 5, 100)),
        Edge.make_three_point_arc((8.351711547, 5, 100), (10.001711547, 3.35, 100), (11.651711547, 5, 100)),
    ]
    m4x0_72 = Solid(Shell([*[Face.make_surface_from_curves(m4x0_72_from[k], m4x0_72_to[k]) for k in range(2)], Face(Wire(m4x0_72_from)), Face(Wire(m4x0_72_to))]))
    add(m4x0_72, mode=Mode.SUBTRACT)

    # M4x0.72 2: loft between two sections, ruled curve by curve
    m4x0_72_2_from = [
        Edge.make_three_point_arc((-8.348288453, 5, 90.137351426), (-9.998288453, 6.65, 90.137351426), (-11.648288453, 5, 90.137351426)),
        Edge.make_three_point_arc((-11.648288453, 5, 90.137351426), (-9.998288453, 3.35, 90.137351426), (-8.348288453, 5, 90.137351426)),
    ]
    m4x0_72_2_to = [
        Edge.make_three_point_arc((-8.348288453, 5, 100), (-9.998288453, 6.65, 100), (-11.648288453, 5, 100)),
        Edge.make_three_point_arc((-11.648288453, 5, 100), (-9.998288453, 3.35, 100), (-8.348288453, 5, 100)),
    ]
    m4x0_72_2 = Solid(Shell([*[Face.make_surface_from_curves(m4x0_72_2_from[k], m4x0_72_2_to[k]) for k in range(2)], Face(Wire(m4x0_72_2_from)), Face(Wire(m4x0_72_2_to))]))
    add(m4x0_72_2, mode=Mode.SUBTRACT)

    # Эскиз16 → Вырез-Вытянуть7 (cut, through all)
    with BuildSketch(Plane(origin=(0, 10, 0), x_dir=(1, 0, 0), z_dir=(0, 1, 0))):
        with BuildLine():
            Line((1.5, -26), (1.5, -45))
            ThreePointArc((1.5, -45), (0, -46.5), (-1.5, -45))
            Line((-1.5, -45), (-1.5, -26))
            ThreePointArc((-1.5, -26), (0, -24.5), (1.5, -26))
        make_face()
    extrude(amount=-CUT_EXTRUDE_7_DEPTH, mode=Mode.SUBTRACT)

    # Эскиз17 → Бобышка-Вытянуть2 (add, through all)
    with BuildSketch(Plane(origin=(0, 10, 0), x_dir=(1, 0, 0), z_dir=(0, 1, 0))):
        with BuildLine():
            Line((-1.5, -29.5), (-1.5, -36.5))
            ThreePointArc((-1.5, -36.5), (-2.085786438, -37.914213562), (-3.5, -38.5))
            Line((-3.5, -38.5), (-5.5, -38.5))
            ThreePointArc((-5.5, -38.5), (-4.085786438, -37.914213562), (-3.5, -36.5))
            Line((-3.5, -36.5), (-3.5, -29.5))
            ThreePointArc((-3.5, -29.5), (-4.085786438, -28.085786438), (-5.5, -27.5))
            Line((-5.5, -27.5), (-3.5, -27.5))
            ThreePointArc((-3.5, -27.5), (-2.085786438, -28.085786438), (-1.5, -29.5))
        make_face()
        with BuildLine():
            Line((-1.5, -42.5), (-1.5, -49.5))
            ThreePointArc((-1.5, -49.5), (-2.085786438, -50.914213562), (-3.5, -51.5))
            Line((-3.5, -51.5), (-5.5, -51.5))
            ThreePointArc((-5.5, -51.5), (-4.085786438, -50.914213562), (-3.5, -49.5))
            Line((-3.5, -49.5), (-3.5, -42.5))
            ThreePointArc((-3.5, -42.5), (-4.085786438, -41.085786438), (-5.5, -40.5))
            Line((-5.5, -40.5), (-3.5, -40.5))
            ThreePointArc((-3.5, -40.5), (-2.085786438, -41.085786438), (-1.5, -42.5))
        make_face()
        with BuildLine():
            Line((5.5, -51.5), (3.5, -51.5))
            ThreePointArc((3.5, -51.5), (2.085786438, -50.914213562), (1.5, -49.5))
            Line((1.5, -49.5), (1.5, -42.5))
            ThreePointArc((1.5, -42.5), (2.085786438, -41.085786438), (3.5, -40.5))
            Line((3.5, -40.5), (5.5, -40.5))
            ThreePointArc((5.5, -40.5), (4.085786438, -41.085786438), (3.5, -42.5))
            Line((3.5, -42.5), (3.5, -49.5))
            ThreePointArc((3.5, -49.5), (4.085786438, -50.914213562), (5.5, -51.5))
        make_face()
        with BuildLine():
            Line((5.5, -38.5), (3.5, -38.5))
            ThreePointArc((3.5, -38.5), (2.085786438, -37.914213562), (1.5, -36.5))
            Line((1.5, -36.5), (1.5, -29.5))
            ThreePointArc((1.5, -29.5), (2.085786438, -28.085786438), (3.5, -27.5))
            Line((3.5, -27.5), (5.5, -27.5))
            ThreePointArc((5.5, -27.5), (4.085786438, -28.085786438), (3.5, -29.5))
            Line((3.5, -29.5), (3.5, -36.5))
            ThreePointArc((3.5, -36.5), (4.085786438, -37.914213562), (5.5, -38.5))
        make_face()
    extrude(amount=-EXTRUDE_2_DEPTH)

    # Эскиз18 → Вырез-Вытянуть8 (cut, through all)
    with BuildSketch(Plane(origin=(0, 10, 0), x_dir=(1, 0, 0), z_dir=(0, 1, 0))):
        with BuildLine():
            Line((-5.5, -27.5), (-10.5, -27.5))
            ThreePointArc((-10.5, -27.5), (-11.914213562, -28.085786438), (-12.5, -29.5))
            Line((-12.5, -29.5), (-12.5, -42.5))
            Line((-12.5, -42.5), (-12.5, -49.5))
            ThreePointArc((-12.5, -49.5), (-11.914213562, -50.914213562), (-10.5, -51.5))
            Line((-10.5, -51.5), (-5.5, -51.5))
            ThreePointArc((-5.5, -51.5), (-4.085786438, -50.914213562), (-3.5, -49.5))
            Line((-3.5, -49.5), (-3.5, -42.5))
            Line((-3.5, -42.5), (-3.5, -29.5))
            ThreePointArc((-3.5, -29.5), (-4.085786438, -28.085786438), (-5.5, -27.5))
        make_face()
        with BuildLine():
            Line((3.5, -29.5), (3.5, -42.5))
            Line((3.5, -42.5), (3.5, -49.5))
            ThreePointArc((3.5, -49.5), (4.085786438, -50.914213562), (5.5, -51.5))
            Line((5.5, -51.5), (10.5, -51.5))
            ThreePointArc((10.5, -51.5), (11.914213562, -50.914213562), (12.5, -49.5))
            Line((12.5, -49.5), (12.5, -42.5))
            Line((12.5, -42.5), (12.5, -29.5))
            ThreePointArc((12.5, -29.5), (11.914213562, -28.085786438), (10.5, -27.5))
            Line((10.5, -27.5), (5.5, -27.5))
            ThreePointArc((5.5, -27.5), (4.085786438, -28.085786438), (3.5, -29.5))
        make_face()
    extrude(amount=-CUT_EXTRUDE_8_DEPTH, mode=Mode.SUBTRACT)


solid = part.part
